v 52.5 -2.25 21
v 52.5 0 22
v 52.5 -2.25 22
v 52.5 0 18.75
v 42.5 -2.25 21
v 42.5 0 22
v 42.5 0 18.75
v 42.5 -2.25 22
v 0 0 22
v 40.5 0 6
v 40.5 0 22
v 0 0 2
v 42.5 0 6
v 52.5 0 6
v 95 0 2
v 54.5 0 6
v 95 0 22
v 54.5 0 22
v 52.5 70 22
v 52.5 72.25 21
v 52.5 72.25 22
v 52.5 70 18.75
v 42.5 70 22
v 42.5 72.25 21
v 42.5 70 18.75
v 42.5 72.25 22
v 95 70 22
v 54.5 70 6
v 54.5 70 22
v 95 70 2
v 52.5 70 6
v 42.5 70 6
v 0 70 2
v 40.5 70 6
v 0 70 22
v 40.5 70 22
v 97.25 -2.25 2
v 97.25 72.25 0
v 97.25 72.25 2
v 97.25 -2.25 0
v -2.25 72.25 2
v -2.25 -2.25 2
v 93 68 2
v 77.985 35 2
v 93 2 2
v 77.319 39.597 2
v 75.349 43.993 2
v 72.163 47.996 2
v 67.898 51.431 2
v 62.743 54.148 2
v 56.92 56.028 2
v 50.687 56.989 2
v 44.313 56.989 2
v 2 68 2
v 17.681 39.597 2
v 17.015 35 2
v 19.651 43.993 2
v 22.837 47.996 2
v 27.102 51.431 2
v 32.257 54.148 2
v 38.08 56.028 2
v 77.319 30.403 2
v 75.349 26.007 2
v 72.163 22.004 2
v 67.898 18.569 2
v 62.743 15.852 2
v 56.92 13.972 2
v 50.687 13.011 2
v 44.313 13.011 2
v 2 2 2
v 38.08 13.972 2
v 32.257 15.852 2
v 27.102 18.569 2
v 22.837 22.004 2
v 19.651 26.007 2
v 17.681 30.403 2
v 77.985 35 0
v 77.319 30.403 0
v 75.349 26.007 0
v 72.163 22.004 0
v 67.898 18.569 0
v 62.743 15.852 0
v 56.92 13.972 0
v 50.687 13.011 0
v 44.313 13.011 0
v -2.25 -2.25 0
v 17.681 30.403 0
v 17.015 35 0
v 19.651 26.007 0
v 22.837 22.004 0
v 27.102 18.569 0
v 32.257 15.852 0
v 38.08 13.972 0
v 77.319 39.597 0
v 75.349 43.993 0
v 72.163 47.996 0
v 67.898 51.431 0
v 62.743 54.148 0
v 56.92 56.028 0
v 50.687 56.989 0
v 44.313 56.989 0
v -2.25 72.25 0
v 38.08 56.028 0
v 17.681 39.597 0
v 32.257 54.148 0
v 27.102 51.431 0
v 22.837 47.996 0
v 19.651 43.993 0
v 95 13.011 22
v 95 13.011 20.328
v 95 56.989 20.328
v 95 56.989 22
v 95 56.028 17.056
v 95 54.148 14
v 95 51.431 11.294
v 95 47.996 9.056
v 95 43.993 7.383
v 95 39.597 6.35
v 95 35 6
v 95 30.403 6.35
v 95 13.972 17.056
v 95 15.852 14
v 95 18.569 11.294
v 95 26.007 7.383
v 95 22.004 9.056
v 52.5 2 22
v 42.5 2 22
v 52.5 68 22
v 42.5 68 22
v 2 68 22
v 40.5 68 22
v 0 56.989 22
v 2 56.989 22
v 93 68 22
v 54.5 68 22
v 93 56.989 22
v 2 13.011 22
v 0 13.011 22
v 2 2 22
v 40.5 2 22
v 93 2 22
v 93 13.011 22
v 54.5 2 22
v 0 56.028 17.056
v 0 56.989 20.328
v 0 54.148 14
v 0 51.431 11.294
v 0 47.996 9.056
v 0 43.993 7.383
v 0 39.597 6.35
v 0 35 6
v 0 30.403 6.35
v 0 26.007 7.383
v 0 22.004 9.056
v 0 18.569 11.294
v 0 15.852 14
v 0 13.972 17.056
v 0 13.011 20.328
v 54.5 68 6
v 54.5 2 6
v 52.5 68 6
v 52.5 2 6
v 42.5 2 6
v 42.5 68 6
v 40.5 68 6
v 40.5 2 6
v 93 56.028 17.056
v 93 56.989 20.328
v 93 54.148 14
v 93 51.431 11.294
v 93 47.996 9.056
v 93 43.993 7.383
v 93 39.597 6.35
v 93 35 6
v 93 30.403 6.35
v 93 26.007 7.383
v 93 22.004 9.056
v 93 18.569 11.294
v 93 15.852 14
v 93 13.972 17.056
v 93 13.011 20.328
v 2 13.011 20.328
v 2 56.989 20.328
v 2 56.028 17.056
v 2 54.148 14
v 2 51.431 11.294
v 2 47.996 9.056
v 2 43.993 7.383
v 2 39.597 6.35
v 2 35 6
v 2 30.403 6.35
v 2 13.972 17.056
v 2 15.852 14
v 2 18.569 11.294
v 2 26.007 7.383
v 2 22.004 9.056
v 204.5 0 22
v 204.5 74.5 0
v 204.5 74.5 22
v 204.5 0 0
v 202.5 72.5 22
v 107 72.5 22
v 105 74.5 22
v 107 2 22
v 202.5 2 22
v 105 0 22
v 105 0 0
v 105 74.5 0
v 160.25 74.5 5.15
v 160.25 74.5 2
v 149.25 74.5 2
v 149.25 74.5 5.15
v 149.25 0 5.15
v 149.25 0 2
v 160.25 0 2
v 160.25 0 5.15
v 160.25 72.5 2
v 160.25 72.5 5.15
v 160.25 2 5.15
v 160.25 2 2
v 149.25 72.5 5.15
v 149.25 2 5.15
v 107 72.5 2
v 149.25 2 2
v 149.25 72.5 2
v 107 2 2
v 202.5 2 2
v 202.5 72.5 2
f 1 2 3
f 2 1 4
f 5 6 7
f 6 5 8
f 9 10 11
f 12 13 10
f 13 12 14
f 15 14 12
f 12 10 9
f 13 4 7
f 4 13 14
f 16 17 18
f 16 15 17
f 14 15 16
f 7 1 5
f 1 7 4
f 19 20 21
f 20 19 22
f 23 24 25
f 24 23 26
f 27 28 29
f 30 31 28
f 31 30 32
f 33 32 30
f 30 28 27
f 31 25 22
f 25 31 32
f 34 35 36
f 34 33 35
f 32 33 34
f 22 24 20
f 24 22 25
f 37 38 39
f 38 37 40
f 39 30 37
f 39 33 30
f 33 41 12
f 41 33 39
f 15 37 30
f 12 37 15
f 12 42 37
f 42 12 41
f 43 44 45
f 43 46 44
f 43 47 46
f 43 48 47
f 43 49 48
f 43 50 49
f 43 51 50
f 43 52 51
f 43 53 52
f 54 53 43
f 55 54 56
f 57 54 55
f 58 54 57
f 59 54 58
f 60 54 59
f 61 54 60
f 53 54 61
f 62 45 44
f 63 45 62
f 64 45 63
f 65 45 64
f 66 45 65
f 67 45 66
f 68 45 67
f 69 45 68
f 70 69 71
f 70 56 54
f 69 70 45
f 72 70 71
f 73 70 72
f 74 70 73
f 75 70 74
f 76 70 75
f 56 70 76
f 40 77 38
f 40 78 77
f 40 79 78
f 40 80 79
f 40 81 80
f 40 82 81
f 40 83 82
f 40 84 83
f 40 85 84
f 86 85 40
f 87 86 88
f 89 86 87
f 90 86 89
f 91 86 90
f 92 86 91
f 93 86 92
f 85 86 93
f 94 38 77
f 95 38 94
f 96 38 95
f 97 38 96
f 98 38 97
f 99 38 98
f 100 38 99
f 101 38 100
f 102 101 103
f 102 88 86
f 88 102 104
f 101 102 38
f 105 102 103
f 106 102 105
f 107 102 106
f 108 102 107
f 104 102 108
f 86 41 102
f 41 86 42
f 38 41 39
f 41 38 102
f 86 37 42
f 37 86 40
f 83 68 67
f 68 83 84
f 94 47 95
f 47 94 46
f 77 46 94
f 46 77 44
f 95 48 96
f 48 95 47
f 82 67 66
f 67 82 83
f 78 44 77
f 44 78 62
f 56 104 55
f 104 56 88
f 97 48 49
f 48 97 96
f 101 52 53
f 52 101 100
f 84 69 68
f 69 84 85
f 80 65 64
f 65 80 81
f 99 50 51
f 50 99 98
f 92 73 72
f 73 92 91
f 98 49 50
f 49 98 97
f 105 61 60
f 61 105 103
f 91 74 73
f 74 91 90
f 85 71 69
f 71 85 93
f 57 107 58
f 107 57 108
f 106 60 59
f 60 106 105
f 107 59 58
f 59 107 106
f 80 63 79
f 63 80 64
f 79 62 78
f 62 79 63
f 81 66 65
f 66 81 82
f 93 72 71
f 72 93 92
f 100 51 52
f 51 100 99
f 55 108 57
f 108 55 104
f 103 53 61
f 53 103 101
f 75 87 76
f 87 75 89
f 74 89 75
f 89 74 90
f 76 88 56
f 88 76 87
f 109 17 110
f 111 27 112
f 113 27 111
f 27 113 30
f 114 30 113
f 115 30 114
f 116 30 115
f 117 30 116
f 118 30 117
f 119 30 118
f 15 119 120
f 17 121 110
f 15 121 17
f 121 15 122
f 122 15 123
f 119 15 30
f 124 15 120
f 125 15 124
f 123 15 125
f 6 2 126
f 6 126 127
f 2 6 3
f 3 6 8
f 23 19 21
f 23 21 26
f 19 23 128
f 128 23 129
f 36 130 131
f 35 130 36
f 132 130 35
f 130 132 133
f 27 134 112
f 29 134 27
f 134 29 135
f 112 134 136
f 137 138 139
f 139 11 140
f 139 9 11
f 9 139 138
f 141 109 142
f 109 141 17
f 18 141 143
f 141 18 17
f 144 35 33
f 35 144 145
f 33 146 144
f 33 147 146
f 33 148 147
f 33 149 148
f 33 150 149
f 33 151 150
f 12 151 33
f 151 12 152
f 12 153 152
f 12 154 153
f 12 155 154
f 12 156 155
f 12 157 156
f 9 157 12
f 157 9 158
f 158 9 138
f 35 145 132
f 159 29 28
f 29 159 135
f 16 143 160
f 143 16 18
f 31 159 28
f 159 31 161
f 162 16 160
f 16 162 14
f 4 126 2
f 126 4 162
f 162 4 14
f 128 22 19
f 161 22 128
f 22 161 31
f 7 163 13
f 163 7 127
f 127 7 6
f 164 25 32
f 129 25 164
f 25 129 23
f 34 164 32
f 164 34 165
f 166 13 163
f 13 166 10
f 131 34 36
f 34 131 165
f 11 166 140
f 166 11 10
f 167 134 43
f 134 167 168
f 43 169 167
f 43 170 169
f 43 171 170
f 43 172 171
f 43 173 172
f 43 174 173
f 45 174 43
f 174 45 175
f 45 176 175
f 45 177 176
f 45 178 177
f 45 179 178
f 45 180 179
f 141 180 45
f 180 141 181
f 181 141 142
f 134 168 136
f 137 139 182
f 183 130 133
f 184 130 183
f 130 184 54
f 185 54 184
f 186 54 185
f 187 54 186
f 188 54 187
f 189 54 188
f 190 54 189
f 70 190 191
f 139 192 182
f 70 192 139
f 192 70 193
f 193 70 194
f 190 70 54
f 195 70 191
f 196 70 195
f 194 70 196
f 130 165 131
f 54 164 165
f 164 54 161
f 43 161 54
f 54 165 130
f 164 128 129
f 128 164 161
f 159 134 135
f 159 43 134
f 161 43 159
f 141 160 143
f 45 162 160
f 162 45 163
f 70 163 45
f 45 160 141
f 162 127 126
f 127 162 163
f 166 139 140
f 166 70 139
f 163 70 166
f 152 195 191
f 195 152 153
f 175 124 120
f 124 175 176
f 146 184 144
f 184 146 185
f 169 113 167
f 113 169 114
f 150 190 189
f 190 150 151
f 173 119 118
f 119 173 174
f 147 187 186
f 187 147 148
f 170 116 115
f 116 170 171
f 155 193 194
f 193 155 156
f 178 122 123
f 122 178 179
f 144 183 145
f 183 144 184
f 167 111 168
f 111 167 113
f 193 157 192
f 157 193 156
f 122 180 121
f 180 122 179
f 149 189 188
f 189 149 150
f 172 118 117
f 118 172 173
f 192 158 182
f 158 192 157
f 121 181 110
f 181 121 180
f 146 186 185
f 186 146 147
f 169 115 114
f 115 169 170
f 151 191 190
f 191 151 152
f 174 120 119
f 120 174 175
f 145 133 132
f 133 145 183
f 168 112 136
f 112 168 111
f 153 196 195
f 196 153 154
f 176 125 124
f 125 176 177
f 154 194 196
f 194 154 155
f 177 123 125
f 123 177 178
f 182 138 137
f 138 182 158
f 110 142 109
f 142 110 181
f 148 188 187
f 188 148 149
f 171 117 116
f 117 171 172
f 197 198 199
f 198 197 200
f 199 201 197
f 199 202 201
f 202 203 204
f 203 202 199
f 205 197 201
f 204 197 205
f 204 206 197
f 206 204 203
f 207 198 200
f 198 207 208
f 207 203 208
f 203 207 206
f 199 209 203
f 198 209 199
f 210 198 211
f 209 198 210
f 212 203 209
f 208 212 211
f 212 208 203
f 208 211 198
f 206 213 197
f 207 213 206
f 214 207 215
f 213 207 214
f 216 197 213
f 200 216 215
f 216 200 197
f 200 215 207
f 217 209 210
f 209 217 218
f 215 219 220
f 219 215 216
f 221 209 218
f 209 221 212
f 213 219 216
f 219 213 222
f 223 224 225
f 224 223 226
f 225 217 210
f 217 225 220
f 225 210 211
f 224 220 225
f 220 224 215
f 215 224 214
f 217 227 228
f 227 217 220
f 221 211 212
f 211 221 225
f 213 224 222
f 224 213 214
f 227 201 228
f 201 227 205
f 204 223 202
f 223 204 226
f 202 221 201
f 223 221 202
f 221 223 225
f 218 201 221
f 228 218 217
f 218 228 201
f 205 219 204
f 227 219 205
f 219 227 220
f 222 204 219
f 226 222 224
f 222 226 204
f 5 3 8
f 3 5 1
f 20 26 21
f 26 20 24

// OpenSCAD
CARD_SIZE_LONG_EDGE =91;
CARD_SIZE_SHORT_EDGE = 66;
CARD_STACK_HEIGHT = 20;
WALL_THICKNESS = 2;
TAB_THICKNESS = 10;
EXTRA_SPACE = .25;
// rounded cutouts remove a "circle" from the bottom surface, and a 1/2 "circle" from each short end of the bottom piece
/* [Cutouts] */
// Percent of card deck height to cutout
END_CUTOUT_HEIGHT_PERCENTAGE = 80; // [0:100]
// Percent of box width to cutout
END_CUTOUT_WIDTH_PERCENTAGE  = 67; // [0:100]
// Percent of box width to cutout
BOTTOM_CUTOUT_WIDTH_PERCENTAGE = 67; // [0:100]
// percent of box length to cutout
BOTTOM_CUTOUT_LENGTH_PERCENTAGE = 67; // [0:100]
// preview[view:south west, tilt:top diagonal]


CARD_LONG_EDGE = CARD_SIZE_LONG_EDGE + (WALL_THICKNESS*2);
CARD_SHORT_EDGE = CARD_SIZE_SHORT_EDGE + (WALL_THICKNESS*2);
ALL_EXTRA_SPACE = (EXTRA_SPACE *2);

LID_OUTSIDE_LONG_THICKNESS = CARD_LONG_EDGE + (WALL_THICKNESS*2);
LID_OUTSIDE_SHORT_THICKNESS = CARD_SHORT_EDGE + (WALL_THICKNESS*2);

SPACE_BETWEEN_BOTTOM_AND_LID = LID_OUTSIDE_LONG_THICKNESS + (WALL_THICKNESS*2)+ 2;

HEIGHT = CARD_STACK_HEIGHT + WALL_THICKNESS;

// rounded cut-outs
// ends
END_CUTOUT_LENGTH = CARD_LONG_EDGE + 2;
END_CUTOUT_RADIUS = CARD_STACK_HEIGHT * END_CUTOUT_HEIGHT_PERCENTAGE/100;
END_CUTOUT_WIDTH  = CARD_SIZE_SHORT_EDGE * END_CUTOUT_WIDTH_PERCENTAGE/100;
// since we'll be scaling our cylinder, we really need the ratio to scale by for the longer dimension, not the direct dimension itself
END_CUTOUT_WIDTH_RATIO = END_CUTOUT_WIDTH / (END_CUTOUT_RADIUS*2);
// bottom
BOTTOM_CUTOUT_LENGTH = (WALL_THICKNESS * 2)+ 2;
BOTTOM_CUTOUT_RADIUS = CARD_SIZE_SHORT_EDGE * BOTTOM_CUTOUT_WIDTH_PERCENTAGE / 2 /100;
BOTTOM_CUTOUT_HEIGHT = CARD_SIZE_LONG_EDGE * BOTTOM_CUTOUT_LENGTH_PERCENTAGE/100;
// since we'll be scaling our cylinder, we really need the ratio to scale by for the longer dimension, not the direct dimension itself
BOTTOM_CUTOUT_HEIGHT_RATIO = BOTTOM_CUTOUT_HEIGHT / (BOTTOM_CUTOUT_RADIUS*2);


	//*Start Bottom of Box

					//*Start wedge 1
translate ([((CARD_LONG_EDGE/2) -(TAB_THICKNESS/2)),-WALL_THICKNESS-EXTRA_SPACE,HEIGHT-WALL_THICKNESS-1-EXTRA_SPACE]) 

difference (){
cube ([TAB_THICKNESS,WALL_THICKNESS+EXTRA_SPACE,WALL_THICKNESS+EXTRA_SPACE]);
translate ([0, WALL_THICKNESS+(EXTRA_SPACE),0]) rotate ([135,0,0])  

cube ([(TAB_THICKNESS+3), sqrt(((WALL_THICKNESS+EXTRA_SPACE)*(WALL_THICKNESS+EXTRA_SPACE))+((WALL_THICKNESS+EXTRA_SPACE)*(WALL_THICKNESS+EXTRA_SPACE))), sqrt(((WALL_THICKNESS+EXTRA_SPACE)*(WALL_THICKNESS+EXTRA_SPACE))+((WALL_THICKNESS+EXTRA_SPACE)*(WALL_THICKNESS+EXTRA_SPACE)))]);

}
			//*end wedge 1


			//*Start wedge 2
translate ([((CARD_LONG_EDGE/2) - (TAB_THICKNESS/2)),CARD_SHORT_EDGE,HEIGHT-WALL_THICKNESS-1-EXTRA_SPACE])

 difference (){
cube ([TAB_THICKNESS,WALL_THICKNESS+EXTRA_SPACE,WALL_THICKNESS+EXTRA_SPACE]);

translate ([0 ,0 ,0]) rotate ([-45,0,0])  cube ([(TAB_THICKNESS+3),sqrt(((WALL_THICKNESS+EXTRA_SPACE)*(WALL_THICKNESS+EXTRA_SPACE))+((WALL_THICKNESS+EXTRA_SPACE)*(WALL_THICKNESS+EXTRA_SPACE))),sqrt(((WALL_THICKNESS+EXTRA_SPACE)*(WALL_THICKNESS+EXTRA_SPACE))+((WALL_THICKNESS+EXTRA_SPACE)*(WALL_THICKNESS+EXTRA_SPACE)))]);
}
			//*end wedge 2


translate ([((CARD_LONG_EDGE/2) -(TAB_THICKNESS/2)),-WALL_THICKNESS-EXTRA_SPACE,HEIGHT-1])  cube ([TAB_THICKNESS, WALL_THICKNESS+EXTRA_SPACE, 1]); 					//*Tab

translate ([((CARD_LONG_EDGE/2) -(TAB_THICKNESS/2)),CARD_SHORT_EDGE,HEIGHT-1])  cube ([TAB_THICKNESS, WALL_THICKNESS+EXTRA_SPACE, 1]);				//*Tab

difference()
{
	translate ([-WALL_THICKNESS-EXTRA_SPACE, -WALL_THICKNESS-EXTRA_SPACE, 0 ]) cube ([CARD_LONG_EDGE + (WALL_THICKNESS*2)+ALL_EXTRA_SPACE, CARD_SHORT_EDGE + (WALL_THICKNESS*2)+ALL_EXTRA_SPACE, WALL_THICKNESS]);  						//*Bottom Plate

	translate([CARD_LONG_EDGE/2,CARD_SHORT_EDGE/2,-WALL_THICKNESS]) scale([BOTTOM_CUTOUT_HEIGHT_RATIO,1,1]) cylinder(h=BOTTOM_CUTOUT_LENGTH,r=BOTTOM_CUTOUT_RADIUS);  //*Bottom cutout to cut through bottom plate
}

difference() 
{
	cube ([CARD_LONG_EDGE,CARD_SHORT_EDGE,HEIGHT]);		//*Main Body

	translate([ ((CARD_LONG_EDGE / 2) + (TAB_THICKNESS/2)), -.5, ((HEIGHT+ WALL_THICKNESS) / 4) ]) cube ([2, CARD_SHORT_EDGE + 2, HEIGHT]);	//*Tab cutout
	
	translate([ ((CARD_LONG_EDGE / 2) - ((TAB_THICKNESS/2)+2)), -.5, ((HEIGHT+ WALL_THICKNESS)/ 4) ]) cube ([2, CARD_SHORT_EDGE + 2, HEIGHT ]);  //*Tab cutout

	translate([WALL_THICKNESS,WALL_THICKNESS,WALL_THICKNESS]) cube ([CARD_LONG_EDGE - (WALL_THICKNESS*2),CARD_SHORT_EDGE - (WALL_THICKNESS*2),HEIGHT]);			//*Hole

    translate([-WALL_THICKNESS/2,CARD_SHORT_EDGE/2,HEIGHT]) scale([1,END_CUTOUT_WIDTH_RATIO,1]) rotate([0,90,0]) cylinder(h=END_CUTOUT_LENGTH,r=END_CUTOUT_RADIUS);  //*End cutout
	translate([CARD_LONG_EDGE/2,CARD_SHORT_EDGE/2,-WALL_THICKNESS]) scale([BOTTOM_CUTOUT_HEIGHT_RATIO,1,1]) cylinder(h=BOTTOM_CUTOUT_LENGTH,r=BOTTOM_CUTOUT_RADIUS);  //*Bottom cutout to cut through main box
}
			//*End Bottom of Box



			//*Start Top of Box


translate ([SPACE_BETWEEN_BOTTOM_AND_LID, 0, 0]) 


difference() 
{
	cube ([LID_OUTSIDE_LONG_THICKNESS+ALL_EXTRA_SPACE, LID_OUTSIDE_SHORT_THICKNESS+ALL_EXTRA_SPACE, HEIGHT]); 		//*Top Main Body


	translate([ ((LID_OUTSIDE_LONG_THICKNESS+ALL_EXTRA_SPACE) / 2)-((TAB_THICKNESS+1)/2), -.5, WALL_THICKNESS]) 
cube ([(TAB_THICKNESS+1), LID_OUTSIDE_SHORT_THICKNESS + 2, WALL_THICKNESS+1.15 ]); 	//*Tab Hole

	translate([WALL_THICKNESS,WALL_THICKNESS, WALL_THICKNESS]) 
cube ([LID_OUTSIDE_LONG_THICKNESS - (WALL_THICKNESS*2)+ALL_EXTRA_SPACE,LID_OUTSIDE_SHORT_THICKNESS - (WALL_THICKNESS*2)+ALL_EXTRA_SPACE,HEIGHT]);		//*Hole
}

			//* End Top of Box
